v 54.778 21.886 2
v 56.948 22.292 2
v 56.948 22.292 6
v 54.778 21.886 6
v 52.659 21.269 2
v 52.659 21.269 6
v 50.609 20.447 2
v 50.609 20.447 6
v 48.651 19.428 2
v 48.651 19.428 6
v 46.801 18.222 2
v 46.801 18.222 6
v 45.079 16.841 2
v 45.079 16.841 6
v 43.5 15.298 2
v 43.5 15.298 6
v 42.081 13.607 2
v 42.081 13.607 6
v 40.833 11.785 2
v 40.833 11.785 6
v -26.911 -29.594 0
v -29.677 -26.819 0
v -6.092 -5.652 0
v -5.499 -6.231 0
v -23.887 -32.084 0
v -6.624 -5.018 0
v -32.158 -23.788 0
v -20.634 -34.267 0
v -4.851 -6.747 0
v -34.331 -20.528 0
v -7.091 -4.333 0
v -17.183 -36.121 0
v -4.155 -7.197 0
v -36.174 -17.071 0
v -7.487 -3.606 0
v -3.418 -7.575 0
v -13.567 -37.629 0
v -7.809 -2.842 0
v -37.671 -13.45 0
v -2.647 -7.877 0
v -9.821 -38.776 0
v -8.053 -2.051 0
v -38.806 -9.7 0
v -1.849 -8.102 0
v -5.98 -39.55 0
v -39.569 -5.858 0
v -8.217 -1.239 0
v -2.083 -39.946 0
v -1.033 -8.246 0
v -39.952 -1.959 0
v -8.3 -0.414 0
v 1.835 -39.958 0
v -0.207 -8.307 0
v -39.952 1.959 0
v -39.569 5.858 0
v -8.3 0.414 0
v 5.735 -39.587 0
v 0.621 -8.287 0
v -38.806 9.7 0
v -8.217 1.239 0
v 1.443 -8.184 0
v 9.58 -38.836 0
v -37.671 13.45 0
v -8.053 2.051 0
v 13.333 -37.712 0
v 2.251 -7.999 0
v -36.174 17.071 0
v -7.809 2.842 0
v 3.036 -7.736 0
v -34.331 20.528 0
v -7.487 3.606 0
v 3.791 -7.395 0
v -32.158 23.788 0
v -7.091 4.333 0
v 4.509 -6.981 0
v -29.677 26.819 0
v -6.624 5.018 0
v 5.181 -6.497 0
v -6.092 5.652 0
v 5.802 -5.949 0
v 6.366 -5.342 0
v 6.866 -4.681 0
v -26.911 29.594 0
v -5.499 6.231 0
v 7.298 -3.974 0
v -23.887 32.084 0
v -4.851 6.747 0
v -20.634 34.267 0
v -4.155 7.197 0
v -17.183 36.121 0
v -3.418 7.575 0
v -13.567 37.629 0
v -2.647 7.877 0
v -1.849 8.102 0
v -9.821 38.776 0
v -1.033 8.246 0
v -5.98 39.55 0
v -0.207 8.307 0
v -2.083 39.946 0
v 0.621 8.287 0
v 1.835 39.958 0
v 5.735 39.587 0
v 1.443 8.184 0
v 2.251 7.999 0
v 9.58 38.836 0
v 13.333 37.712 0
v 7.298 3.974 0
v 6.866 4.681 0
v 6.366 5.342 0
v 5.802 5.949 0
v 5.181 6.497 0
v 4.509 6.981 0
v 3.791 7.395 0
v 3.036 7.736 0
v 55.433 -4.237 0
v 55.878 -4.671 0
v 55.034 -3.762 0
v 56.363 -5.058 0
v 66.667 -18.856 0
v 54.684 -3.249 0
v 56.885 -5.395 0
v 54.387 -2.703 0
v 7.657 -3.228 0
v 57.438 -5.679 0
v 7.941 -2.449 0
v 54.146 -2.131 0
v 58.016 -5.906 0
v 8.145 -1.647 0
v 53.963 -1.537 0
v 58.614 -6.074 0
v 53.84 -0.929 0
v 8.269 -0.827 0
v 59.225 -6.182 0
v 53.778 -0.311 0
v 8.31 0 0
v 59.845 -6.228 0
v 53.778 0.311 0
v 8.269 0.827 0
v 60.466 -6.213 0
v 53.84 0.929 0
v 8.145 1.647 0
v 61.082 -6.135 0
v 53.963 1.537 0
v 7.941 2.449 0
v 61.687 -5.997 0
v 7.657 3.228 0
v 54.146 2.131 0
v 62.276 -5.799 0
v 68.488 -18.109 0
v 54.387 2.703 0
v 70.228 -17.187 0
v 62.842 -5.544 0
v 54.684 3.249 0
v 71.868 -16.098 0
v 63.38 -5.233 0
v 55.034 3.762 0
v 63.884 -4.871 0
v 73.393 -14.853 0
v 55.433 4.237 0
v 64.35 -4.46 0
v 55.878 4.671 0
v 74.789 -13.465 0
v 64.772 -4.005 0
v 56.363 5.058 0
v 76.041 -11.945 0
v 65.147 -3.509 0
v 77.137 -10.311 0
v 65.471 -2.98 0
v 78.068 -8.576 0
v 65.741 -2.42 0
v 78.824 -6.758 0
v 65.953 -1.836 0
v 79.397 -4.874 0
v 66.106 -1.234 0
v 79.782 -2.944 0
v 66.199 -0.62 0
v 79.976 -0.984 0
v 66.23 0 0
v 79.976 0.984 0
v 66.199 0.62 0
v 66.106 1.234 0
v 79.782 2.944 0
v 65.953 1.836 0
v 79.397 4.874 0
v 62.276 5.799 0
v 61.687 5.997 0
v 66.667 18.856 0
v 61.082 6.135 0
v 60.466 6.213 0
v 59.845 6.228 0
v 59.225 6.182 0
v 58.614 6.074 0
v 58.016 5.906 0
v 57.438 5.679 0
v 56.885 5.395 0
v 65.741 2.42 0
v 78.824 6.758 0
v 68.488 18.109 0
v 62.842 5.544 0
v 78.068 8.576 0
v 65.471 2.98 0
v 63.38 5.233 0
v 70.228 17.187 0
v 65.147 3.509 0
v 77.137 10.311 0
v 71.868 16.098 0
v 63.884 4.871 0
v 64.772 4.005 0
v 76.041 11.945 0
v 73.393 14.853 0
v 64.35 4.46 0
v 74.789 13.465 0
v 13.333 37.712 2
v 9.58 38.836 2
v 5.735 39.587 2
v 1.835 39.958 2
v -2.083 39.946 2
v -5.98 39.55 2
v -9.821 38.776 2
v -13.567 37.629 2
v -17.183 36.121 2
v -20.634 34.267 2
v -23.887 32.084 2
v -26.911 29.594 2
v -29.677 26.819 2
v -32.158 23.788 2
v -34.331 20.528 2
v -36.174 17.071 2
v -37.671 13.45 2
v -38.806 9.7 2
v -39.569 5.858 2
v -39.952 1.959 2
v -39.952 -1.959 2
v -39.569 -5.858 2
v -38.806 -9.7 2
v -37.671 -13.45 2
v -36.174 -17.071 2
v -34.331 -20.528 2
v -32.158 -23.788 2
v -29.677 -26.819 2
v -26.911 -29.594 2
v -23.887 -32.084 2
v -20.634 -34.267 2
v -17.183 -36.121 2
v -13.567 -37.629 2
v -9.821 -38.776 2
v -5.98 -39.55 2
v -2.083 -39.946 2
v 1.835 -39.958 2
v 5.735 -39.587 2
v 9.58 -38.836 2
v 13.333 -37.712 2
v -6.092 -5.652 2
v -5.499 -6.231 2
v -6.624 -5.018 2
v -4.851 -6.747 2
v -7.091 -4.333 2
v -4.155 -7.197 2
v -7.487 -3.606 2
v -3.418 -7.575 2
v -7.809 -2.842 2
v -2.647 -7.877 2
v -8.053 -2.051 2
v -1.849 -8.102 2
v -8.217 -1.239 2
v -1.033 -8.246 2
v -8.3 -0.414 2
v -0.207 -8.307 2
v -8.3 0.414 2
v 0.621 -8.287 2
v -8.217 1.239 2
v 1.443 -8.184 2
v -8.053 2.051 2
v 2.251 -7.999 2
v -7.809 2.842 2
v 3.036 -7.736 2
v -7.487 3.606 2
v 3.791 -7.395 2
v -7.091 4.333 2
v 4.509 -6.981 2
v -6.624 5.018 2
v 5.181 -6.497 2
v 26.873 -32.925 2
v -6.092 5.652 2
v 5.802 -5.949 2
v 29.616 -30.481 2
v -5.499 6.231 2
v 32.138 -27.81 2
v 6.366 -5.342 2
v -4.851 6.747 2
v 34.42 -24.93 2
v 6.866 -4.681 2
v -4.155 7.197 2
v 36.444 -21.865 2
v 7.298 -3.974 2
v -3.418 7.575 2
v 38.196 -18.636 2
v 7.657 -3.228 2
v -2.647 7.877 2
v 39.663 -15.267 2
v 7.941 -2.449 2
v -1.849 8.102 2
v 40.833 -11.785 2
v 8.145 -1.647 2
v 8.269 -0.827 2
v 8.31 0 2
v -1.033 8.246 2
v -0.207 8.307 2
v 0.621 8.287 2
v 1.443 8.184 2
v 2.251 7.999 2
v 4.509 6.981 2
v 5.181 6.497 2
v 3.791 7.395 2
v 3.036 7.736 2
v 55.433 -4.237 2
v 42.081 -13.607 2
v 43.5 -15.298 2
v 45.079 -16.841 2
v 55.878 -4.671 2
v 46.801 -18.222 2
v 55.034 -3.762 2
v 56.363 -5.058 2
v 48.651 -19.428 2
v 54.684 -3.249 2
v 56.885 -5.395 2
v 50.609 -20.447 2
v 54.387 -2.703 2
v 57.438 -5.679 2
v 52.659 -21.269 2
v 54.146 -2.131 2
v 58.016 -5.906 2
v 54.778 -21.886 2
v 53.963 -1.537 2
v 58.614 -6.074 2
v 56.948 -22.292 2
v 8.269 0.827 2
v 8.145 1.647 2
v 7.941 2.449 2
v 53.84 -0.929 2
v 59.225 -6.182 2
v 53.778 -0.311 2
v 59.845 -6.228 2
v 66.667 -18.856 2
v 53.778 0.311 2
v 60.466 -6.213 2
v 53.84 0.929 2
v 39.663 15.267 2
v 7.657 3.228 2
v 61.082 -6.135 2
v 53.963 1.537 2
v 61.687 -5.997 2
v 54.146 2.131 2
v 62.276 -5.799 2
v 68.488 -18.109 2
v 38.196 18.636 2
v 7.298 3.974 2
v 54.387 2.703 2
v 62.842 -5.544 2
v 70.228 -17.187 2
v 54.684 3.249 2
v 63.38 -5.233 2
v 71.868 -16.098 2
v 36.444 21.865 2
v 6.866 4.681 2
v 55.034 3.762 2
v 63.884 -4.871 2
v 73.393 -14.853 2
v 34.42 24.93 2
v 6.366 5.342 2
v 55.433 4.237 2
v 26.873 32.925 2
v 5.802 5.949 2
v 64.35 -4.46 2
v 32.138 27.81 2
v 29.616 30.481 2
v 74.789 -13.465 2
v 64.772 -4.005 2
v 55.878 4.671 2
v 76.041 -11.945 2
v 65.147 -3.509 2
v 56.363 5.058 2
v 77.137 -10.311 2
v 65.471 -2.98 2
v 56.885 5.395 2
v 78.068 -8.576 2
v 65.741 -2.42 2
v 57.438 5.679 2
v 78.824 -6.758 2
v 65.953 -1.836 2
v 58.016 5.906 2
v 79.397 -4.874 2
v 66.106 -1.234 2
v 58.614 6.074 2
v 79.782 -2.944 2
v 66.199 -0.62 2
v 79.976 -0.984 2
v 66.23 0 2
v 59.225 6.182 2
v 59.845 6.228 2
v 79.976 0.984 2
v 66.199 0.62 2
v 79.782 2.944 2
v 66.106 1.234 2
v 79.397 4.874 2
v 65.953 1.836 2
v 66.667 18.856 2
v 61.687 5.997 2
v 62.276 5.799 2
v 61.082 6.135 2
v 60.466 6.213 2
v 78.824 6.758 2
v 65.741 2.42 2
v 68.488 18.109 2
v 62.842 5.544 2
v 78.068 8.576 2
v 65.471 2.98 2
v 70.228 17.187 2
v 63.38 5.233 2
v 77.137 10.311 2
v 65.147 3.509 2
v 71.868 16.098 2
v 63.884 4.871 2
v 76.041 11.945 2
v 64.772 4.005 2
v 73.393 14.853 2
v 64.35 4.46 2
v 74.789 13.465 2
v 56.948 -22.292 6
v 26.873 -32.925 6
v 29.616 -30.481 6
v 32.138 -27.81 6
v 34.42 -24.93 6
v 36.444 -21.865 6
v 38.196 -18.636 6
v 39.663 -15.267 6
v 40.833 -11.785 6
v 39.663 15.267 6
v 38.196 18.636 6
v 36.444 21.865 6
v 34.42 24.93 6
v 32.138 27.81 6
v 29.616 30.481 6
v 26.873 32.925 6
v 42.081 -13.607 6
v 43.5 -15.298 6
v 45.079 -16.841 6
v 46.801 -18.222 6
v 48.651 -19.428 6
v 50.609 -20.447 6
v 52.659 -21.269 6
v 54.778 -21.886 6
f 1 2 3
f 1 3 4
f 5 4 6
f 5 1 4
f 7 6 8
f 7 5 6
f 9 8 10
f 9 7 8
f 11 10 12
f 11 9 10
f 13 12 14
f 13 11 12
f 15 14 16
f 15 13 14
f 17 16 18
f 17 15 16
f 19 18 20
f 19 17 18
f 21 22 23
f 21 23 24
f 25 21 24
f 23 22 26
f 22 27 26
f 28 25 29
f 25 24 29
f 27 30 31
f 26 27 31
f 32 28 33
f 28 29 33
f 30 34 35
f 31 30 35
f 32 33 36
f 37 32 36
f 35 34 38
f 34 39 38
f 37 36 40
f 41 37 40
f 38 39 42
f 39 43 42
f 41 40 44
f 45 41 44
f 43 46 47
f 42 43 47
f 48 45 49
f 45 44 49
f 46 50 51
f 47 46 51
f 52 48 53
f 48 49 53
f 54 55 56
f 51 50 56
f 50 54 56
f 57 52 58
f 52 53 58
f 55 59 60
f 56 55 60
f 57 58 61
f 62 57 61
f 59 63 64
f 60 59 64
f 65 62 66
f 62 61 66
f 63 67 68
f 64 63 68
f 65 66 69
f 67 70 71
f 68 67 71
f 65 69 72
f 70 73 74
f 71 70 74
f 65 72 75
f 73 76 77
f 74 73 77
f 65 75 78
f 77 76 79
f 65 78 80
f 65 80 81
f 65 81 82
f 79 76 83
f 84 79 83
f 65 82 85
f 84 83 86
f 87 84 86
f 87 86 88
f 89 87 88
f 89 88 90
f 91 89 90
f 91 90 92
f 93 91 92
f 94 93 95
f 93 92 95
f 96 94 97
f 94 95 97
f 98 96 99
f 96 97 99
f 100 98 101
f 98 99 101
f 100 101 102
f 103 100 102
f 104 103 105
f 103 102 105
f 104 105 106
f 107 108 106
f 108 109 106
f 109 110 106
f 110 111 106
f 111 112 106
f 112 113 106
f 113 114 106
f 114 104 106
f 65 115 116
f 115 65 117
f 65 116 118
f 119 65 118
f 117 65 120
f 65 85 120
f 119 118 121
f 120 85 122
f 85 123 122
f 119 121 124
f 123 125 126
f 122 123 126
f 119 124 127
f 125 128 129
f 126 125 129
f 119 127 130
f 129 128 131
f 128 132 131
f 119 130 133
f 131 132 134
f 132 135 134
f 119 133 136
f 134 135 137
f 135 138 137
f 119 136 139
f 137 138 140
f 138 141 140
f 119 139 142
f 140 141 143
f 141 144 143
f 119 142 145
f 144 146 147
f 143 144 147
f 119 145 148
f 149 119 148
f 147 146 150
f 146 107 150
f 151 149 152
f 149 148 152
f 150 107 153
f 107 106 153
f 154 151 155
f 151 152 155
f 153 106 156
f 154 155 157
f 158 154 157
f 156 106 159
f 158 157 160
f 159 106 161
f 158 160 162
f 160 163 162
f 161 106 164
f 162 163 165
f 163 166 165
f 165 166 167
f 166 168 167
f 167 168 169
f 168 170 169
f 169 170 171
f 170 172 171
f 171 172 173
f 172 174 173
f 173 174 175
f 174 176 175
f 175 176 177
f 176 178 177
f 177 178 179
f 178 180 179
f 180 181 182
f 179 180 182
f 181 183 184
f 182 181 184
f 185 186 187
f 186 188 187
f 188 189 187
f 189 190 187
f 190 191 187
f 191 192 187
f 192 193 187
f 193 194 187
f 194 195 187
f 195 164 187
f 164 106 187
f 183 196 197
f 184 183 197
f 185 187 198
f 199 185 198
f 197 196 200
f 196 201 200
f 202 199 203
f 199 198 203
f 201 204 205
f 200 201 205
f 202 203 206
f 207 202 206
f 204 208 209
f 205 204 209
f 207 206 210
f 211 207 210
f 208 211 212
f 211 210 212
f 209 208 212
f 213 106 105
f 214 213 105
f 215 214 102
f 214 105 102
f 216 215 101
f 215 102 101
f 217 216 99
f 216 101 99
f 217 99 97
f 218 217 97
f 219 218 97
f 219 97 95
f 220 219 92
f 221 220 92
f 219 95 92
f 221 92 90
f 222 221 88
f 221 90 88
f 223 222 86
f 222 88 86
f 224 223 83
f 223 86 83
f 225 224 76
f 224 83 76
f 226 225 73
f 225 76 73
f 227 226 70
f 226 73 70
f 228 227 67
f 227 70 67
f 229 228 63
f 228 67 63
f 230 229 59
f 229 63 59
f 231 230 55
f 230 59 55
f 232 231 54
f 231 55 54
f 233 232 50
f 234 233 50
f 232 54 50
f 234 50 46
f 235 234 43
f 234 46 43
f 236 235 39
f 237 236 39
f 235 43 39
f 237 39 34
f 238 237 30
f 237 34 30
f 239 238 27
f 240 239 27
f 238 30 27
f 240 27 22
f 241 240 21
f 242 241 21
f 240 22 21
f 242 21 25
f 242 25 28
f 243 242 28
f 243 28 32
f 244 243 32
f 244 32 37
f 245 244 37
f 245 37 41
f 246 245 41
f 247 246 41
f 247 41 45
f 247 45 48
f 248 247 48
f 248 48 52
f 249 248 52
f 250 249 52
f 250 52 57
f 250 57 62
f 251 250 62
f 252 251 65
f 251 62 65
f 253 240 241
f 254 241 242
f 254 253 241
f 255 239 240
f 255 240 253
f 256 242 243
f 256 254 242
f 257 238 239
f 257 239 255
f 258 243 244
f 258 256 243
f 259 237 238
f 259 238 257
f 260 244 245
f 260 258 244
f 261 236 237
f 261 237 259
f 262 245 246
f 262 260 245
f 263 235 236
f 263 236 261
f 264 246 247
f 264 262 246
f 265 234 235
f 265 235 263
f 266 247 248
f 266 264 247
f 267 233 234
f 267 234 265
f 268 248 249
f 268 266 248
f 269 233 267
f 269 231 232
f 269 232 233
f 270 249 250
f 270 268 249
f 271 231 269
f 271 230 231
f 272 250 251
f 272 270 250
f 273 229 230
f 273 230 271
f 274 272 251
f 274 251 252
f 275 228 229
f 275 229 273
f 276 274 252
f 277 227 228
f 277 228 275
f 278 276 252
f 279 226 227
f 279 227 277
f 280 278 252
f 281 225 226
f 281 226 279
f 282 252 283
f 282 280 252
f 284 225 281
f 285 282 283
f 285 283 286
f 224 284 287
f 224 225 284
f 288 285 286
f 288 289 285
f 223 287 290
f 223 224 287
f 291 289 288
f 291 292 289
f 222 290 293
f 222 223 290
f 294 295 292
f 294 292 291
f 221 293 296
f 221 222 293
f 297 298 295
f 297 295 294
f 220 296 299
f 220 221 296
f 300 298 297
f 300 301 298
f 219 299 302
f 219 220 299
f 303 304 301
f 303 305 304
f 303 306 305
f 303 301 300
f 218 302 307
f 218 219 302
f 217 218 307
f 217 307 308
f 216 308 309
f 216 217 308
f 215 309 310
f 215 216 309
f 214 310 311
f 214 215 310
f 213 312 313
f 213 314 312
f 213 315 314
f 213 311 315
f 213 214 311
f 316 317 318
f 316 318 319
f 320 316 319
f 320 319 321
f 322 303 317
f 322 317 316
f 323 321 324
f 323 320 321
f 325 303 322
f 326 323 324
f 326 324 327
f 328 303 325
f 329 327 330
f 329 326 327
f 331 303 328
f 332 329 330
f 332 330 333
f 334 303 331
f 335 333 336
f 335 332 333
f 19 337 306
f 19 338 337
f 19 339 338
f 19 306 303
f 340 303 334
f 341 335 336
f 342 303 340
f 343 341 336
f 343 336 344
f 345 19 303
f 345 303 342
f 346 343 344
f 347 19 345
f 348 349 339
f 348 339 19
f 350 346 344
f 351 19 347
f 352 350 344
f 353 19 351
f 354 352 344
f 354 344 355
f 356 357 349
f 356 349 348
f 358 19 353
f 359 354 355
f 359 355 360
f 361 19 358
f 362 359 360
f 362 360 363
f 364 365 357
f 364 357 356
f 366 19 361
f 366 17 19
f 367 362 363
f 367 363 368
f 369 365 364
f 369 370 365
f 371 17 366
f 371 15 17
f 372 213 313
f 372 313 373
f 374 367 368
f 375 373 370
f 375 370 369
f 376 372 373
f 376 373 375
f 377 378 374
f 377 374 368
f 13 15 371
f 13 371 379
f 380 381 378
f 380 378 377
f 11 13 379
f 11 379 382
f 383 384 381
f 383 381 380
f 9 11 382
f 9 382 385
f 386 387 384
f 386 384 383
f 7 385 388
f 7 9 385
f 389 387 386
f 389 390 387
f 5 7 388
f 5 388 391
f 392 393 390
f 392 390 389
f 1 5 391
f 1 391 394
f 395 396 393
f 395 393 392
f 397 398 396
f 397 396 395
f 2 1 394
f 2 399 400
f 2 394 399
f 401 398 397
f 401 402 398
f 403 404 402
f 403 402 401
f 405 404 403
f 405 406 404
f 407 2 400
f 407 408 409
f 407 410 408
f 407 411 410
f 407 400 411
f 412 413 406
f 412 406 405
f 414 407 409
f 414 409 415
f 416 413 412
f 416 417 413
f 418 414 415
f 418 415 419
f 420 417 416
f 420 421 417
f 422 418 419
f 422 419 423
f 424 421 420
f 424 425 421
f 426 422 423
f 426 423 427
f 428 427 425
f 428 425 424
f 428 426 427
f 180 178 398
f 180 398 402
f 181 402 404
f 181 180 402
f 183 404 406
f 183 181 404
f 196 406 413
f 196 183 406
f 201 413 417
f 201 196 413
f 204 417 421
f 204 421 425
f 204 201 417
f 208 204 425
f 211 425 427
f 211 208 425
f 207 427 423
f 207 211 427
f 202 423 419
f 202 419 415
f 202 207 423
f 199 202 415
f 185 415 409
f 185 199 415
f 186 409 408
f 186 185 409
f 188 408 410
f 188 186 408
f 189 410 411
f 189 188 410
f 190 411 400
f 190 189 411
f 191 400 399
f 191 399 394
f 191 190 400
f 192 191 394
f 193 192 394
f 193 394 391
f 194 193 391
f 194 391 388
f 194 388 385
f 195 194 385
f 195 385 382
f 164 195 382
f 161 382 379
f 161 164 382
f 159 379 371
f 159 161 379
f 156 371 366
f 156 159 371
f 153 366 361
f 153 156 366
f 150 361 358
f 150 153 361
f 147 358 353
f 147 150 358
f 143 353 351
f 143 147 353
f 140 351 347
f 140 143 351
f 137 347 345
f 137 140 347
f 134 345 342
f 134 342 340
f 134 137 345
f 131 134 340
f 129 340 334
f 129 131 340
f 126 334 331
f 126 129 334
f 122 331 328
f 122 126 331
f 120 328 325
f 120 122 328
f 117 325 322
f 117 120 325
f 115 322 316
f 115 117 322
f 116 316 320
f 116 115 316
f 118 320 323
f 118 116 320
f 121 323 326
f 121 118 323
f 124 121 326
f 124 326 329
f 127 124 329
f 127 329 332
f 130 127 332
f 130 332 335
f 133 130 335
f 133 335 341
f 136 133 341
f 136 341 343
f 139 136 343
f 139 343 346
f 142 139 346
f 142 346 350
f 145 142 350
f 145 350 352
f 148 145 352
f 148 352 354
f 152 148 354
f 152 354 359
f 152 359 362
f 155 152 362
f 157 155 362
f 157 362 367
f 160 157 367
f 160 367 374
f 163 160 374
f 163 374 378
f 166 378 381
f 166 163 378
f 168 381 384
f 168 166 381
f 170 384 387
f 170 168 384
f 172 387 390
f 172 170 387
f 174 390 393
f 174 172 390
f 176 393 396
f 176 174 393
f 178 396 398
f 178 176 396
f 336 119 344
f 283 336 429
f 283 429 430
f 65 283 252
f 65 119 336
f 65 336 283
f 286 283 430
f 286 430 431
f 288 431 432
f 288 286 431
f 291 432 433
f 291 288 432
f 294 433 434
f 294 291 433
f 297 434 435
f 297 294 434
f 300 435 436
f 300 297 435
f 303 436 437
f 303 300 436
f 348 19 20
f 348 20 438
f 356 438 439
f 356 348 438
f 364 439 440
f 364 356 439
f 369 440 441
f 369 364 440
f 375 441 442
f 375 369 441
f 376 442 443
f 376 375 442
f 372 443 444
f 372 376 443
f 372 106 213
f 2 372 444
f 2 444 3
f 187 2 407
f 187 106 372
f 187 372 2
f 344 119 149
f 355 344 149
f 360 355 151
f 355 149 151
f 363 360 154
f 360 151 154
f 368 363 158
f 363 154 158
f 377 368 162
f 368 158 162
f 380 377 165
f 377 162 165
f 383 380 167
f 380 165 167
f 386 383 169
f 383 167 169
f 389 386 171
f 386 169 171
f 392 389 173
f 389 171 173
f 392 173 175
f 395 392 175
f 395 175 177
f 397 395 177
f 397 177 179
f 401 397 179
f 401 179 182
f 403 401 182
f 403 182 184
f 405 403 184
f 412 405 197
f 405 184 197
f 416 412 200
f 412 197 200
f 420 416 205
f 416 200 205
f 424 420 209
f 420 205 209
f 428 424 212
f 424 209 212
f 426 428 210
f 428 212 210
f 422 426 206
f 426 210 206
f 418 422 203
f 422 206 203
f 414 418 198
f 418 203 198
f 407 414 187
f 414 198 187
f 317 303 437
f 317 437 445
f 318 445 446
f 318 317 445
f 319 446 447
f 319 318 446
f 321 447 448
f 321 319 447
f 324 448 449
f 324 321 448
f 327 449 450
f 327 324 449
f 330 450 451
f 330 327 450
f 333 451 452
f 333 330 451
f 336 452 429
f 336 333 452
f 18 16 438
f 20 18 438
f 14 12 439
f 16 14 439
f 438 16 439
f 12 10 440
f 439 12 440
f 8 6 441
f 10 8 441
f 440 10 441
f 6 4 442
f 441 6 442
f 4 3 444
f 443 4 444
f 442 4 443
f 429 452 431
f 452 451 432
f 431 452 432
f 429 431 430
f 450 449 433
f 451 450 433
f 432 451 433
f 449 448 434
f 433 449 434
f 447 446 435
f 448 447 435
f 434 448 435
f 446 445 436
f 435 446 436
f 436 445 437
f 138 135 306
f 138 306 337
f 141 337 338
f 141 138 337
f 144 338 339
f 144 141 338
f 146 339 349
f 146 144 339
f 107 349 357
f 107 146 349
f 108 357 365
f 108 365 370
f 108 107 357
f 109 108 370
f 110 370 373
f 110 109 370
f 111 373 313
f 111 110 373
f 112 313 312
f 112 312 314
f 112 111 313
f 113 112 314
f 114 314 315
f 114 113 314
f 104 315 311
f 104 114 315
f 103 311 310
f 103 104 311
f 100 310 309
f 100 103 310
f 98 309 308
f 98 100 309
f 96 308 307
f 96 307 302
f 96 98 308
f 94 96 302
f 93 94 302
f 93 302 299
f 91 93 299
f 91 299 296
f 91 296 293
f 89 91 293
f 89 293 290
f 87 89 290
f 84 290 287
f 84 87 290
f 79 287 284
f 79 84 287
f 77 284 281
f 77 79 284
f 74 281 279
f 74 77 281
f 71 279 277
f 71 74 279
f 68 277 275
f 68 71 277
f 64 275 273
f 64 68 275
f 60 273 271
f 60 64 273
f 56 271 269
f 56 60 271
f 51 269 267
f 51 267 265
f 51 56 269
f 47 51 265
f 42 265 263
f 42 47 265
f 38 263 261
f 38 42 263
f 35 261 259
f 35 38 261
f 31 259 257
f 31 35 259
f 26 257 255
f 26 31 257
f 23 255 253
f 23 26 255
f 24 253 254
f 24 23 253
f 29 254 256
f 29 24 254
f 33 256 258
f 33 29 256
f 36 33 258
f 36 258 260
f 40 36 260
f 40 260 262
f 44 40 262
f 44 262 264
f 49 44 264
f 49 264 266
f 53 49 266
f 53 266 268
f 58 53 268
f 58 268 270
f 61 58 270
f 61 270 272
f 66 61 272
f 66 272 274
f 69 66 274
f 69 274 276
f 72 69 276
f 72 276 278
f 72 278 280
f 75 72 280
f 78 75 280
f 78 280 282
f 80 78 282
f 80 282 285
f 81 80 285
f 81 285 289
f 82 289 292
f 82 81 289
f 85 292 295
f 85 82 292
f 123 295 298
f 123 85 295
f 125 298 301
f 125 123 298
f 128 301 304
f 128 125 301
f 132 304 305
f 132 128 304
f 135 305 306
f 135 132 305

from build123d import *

# Parameters (mm, degrees)
EXTRUDE009_DEPTH = 4
SKETCH002_R      = 8.31
SKETCH002_R_2    = 6.23
EXTRUDE002_DEPTH = 2


with BuildPart() as juncao:
    # Sketch012 (on Face8 of Extrude002) → Extrude009 (new body)
    with BuildSketch(Plane.XY.offset(2)):
        with BuildLine():
            ThreePointArc((26.8733973411, -32.9252261245), (35.4651440174, -23.4195123738), (40.8333333333, -11.7851130198))
            ThreePointArc((40.8333333333, -11.7851130198), (47.7113101314, -18.8477611751), (56.9484135086, -22.2921021863))
            Line((56.9484135086, -22.2921021863), (26.8733973411, -32.9252261245))
        make_face()
        with BuildLine():
            ThreePointArc((56.9484135086, 22.2921021863), (47.7113101314, 18.8477611751), (40.8333333333, 11.7851130198))
            ThreePointArc((40.8333333333, 11.7851130198), (35.4651440174, 23.4195123738), (26.8733973411, 32.9252261245))
            Line((56.9484135086, 22.2921021863), (26.8733973411, 32.9252261245))
        make_face()
    extrude(amount=EXTRUDE009_DEPTH)


with BuildPart() as base001:
    # Sketch002 → Extrude002 (new body)
    with BuildSketch(Plane.XY):
        with BuildLine():
            ThreePointArc((13.3333333333, 37.7123616633), (-40, 0), (13.3333333333, -37.7123616633))
            Line((66.6666666667, -18.8561808316), (13.3333333333, -37.7123616633))
            ThreePointArc((66.6666666667, -18.8561808316), (80, 0), (66.6666666667, 18.8561808316))
            Line((13.3333333333, 37.7123616633), (66.6666666667, 18.8561808316))
        make_face()
        Circle(SKETCH002_R, mode=Mode.SUBTRACT)
        with Locations((60, 0)):
            Circle(SKETCH002_R_2, mode=Mode.SUBTRACT)
    extrude(amount=EXTRUDE002_DEPTH)

    # Fusion002: union Juncao
    add(juncao.part)


solid = base001.part
